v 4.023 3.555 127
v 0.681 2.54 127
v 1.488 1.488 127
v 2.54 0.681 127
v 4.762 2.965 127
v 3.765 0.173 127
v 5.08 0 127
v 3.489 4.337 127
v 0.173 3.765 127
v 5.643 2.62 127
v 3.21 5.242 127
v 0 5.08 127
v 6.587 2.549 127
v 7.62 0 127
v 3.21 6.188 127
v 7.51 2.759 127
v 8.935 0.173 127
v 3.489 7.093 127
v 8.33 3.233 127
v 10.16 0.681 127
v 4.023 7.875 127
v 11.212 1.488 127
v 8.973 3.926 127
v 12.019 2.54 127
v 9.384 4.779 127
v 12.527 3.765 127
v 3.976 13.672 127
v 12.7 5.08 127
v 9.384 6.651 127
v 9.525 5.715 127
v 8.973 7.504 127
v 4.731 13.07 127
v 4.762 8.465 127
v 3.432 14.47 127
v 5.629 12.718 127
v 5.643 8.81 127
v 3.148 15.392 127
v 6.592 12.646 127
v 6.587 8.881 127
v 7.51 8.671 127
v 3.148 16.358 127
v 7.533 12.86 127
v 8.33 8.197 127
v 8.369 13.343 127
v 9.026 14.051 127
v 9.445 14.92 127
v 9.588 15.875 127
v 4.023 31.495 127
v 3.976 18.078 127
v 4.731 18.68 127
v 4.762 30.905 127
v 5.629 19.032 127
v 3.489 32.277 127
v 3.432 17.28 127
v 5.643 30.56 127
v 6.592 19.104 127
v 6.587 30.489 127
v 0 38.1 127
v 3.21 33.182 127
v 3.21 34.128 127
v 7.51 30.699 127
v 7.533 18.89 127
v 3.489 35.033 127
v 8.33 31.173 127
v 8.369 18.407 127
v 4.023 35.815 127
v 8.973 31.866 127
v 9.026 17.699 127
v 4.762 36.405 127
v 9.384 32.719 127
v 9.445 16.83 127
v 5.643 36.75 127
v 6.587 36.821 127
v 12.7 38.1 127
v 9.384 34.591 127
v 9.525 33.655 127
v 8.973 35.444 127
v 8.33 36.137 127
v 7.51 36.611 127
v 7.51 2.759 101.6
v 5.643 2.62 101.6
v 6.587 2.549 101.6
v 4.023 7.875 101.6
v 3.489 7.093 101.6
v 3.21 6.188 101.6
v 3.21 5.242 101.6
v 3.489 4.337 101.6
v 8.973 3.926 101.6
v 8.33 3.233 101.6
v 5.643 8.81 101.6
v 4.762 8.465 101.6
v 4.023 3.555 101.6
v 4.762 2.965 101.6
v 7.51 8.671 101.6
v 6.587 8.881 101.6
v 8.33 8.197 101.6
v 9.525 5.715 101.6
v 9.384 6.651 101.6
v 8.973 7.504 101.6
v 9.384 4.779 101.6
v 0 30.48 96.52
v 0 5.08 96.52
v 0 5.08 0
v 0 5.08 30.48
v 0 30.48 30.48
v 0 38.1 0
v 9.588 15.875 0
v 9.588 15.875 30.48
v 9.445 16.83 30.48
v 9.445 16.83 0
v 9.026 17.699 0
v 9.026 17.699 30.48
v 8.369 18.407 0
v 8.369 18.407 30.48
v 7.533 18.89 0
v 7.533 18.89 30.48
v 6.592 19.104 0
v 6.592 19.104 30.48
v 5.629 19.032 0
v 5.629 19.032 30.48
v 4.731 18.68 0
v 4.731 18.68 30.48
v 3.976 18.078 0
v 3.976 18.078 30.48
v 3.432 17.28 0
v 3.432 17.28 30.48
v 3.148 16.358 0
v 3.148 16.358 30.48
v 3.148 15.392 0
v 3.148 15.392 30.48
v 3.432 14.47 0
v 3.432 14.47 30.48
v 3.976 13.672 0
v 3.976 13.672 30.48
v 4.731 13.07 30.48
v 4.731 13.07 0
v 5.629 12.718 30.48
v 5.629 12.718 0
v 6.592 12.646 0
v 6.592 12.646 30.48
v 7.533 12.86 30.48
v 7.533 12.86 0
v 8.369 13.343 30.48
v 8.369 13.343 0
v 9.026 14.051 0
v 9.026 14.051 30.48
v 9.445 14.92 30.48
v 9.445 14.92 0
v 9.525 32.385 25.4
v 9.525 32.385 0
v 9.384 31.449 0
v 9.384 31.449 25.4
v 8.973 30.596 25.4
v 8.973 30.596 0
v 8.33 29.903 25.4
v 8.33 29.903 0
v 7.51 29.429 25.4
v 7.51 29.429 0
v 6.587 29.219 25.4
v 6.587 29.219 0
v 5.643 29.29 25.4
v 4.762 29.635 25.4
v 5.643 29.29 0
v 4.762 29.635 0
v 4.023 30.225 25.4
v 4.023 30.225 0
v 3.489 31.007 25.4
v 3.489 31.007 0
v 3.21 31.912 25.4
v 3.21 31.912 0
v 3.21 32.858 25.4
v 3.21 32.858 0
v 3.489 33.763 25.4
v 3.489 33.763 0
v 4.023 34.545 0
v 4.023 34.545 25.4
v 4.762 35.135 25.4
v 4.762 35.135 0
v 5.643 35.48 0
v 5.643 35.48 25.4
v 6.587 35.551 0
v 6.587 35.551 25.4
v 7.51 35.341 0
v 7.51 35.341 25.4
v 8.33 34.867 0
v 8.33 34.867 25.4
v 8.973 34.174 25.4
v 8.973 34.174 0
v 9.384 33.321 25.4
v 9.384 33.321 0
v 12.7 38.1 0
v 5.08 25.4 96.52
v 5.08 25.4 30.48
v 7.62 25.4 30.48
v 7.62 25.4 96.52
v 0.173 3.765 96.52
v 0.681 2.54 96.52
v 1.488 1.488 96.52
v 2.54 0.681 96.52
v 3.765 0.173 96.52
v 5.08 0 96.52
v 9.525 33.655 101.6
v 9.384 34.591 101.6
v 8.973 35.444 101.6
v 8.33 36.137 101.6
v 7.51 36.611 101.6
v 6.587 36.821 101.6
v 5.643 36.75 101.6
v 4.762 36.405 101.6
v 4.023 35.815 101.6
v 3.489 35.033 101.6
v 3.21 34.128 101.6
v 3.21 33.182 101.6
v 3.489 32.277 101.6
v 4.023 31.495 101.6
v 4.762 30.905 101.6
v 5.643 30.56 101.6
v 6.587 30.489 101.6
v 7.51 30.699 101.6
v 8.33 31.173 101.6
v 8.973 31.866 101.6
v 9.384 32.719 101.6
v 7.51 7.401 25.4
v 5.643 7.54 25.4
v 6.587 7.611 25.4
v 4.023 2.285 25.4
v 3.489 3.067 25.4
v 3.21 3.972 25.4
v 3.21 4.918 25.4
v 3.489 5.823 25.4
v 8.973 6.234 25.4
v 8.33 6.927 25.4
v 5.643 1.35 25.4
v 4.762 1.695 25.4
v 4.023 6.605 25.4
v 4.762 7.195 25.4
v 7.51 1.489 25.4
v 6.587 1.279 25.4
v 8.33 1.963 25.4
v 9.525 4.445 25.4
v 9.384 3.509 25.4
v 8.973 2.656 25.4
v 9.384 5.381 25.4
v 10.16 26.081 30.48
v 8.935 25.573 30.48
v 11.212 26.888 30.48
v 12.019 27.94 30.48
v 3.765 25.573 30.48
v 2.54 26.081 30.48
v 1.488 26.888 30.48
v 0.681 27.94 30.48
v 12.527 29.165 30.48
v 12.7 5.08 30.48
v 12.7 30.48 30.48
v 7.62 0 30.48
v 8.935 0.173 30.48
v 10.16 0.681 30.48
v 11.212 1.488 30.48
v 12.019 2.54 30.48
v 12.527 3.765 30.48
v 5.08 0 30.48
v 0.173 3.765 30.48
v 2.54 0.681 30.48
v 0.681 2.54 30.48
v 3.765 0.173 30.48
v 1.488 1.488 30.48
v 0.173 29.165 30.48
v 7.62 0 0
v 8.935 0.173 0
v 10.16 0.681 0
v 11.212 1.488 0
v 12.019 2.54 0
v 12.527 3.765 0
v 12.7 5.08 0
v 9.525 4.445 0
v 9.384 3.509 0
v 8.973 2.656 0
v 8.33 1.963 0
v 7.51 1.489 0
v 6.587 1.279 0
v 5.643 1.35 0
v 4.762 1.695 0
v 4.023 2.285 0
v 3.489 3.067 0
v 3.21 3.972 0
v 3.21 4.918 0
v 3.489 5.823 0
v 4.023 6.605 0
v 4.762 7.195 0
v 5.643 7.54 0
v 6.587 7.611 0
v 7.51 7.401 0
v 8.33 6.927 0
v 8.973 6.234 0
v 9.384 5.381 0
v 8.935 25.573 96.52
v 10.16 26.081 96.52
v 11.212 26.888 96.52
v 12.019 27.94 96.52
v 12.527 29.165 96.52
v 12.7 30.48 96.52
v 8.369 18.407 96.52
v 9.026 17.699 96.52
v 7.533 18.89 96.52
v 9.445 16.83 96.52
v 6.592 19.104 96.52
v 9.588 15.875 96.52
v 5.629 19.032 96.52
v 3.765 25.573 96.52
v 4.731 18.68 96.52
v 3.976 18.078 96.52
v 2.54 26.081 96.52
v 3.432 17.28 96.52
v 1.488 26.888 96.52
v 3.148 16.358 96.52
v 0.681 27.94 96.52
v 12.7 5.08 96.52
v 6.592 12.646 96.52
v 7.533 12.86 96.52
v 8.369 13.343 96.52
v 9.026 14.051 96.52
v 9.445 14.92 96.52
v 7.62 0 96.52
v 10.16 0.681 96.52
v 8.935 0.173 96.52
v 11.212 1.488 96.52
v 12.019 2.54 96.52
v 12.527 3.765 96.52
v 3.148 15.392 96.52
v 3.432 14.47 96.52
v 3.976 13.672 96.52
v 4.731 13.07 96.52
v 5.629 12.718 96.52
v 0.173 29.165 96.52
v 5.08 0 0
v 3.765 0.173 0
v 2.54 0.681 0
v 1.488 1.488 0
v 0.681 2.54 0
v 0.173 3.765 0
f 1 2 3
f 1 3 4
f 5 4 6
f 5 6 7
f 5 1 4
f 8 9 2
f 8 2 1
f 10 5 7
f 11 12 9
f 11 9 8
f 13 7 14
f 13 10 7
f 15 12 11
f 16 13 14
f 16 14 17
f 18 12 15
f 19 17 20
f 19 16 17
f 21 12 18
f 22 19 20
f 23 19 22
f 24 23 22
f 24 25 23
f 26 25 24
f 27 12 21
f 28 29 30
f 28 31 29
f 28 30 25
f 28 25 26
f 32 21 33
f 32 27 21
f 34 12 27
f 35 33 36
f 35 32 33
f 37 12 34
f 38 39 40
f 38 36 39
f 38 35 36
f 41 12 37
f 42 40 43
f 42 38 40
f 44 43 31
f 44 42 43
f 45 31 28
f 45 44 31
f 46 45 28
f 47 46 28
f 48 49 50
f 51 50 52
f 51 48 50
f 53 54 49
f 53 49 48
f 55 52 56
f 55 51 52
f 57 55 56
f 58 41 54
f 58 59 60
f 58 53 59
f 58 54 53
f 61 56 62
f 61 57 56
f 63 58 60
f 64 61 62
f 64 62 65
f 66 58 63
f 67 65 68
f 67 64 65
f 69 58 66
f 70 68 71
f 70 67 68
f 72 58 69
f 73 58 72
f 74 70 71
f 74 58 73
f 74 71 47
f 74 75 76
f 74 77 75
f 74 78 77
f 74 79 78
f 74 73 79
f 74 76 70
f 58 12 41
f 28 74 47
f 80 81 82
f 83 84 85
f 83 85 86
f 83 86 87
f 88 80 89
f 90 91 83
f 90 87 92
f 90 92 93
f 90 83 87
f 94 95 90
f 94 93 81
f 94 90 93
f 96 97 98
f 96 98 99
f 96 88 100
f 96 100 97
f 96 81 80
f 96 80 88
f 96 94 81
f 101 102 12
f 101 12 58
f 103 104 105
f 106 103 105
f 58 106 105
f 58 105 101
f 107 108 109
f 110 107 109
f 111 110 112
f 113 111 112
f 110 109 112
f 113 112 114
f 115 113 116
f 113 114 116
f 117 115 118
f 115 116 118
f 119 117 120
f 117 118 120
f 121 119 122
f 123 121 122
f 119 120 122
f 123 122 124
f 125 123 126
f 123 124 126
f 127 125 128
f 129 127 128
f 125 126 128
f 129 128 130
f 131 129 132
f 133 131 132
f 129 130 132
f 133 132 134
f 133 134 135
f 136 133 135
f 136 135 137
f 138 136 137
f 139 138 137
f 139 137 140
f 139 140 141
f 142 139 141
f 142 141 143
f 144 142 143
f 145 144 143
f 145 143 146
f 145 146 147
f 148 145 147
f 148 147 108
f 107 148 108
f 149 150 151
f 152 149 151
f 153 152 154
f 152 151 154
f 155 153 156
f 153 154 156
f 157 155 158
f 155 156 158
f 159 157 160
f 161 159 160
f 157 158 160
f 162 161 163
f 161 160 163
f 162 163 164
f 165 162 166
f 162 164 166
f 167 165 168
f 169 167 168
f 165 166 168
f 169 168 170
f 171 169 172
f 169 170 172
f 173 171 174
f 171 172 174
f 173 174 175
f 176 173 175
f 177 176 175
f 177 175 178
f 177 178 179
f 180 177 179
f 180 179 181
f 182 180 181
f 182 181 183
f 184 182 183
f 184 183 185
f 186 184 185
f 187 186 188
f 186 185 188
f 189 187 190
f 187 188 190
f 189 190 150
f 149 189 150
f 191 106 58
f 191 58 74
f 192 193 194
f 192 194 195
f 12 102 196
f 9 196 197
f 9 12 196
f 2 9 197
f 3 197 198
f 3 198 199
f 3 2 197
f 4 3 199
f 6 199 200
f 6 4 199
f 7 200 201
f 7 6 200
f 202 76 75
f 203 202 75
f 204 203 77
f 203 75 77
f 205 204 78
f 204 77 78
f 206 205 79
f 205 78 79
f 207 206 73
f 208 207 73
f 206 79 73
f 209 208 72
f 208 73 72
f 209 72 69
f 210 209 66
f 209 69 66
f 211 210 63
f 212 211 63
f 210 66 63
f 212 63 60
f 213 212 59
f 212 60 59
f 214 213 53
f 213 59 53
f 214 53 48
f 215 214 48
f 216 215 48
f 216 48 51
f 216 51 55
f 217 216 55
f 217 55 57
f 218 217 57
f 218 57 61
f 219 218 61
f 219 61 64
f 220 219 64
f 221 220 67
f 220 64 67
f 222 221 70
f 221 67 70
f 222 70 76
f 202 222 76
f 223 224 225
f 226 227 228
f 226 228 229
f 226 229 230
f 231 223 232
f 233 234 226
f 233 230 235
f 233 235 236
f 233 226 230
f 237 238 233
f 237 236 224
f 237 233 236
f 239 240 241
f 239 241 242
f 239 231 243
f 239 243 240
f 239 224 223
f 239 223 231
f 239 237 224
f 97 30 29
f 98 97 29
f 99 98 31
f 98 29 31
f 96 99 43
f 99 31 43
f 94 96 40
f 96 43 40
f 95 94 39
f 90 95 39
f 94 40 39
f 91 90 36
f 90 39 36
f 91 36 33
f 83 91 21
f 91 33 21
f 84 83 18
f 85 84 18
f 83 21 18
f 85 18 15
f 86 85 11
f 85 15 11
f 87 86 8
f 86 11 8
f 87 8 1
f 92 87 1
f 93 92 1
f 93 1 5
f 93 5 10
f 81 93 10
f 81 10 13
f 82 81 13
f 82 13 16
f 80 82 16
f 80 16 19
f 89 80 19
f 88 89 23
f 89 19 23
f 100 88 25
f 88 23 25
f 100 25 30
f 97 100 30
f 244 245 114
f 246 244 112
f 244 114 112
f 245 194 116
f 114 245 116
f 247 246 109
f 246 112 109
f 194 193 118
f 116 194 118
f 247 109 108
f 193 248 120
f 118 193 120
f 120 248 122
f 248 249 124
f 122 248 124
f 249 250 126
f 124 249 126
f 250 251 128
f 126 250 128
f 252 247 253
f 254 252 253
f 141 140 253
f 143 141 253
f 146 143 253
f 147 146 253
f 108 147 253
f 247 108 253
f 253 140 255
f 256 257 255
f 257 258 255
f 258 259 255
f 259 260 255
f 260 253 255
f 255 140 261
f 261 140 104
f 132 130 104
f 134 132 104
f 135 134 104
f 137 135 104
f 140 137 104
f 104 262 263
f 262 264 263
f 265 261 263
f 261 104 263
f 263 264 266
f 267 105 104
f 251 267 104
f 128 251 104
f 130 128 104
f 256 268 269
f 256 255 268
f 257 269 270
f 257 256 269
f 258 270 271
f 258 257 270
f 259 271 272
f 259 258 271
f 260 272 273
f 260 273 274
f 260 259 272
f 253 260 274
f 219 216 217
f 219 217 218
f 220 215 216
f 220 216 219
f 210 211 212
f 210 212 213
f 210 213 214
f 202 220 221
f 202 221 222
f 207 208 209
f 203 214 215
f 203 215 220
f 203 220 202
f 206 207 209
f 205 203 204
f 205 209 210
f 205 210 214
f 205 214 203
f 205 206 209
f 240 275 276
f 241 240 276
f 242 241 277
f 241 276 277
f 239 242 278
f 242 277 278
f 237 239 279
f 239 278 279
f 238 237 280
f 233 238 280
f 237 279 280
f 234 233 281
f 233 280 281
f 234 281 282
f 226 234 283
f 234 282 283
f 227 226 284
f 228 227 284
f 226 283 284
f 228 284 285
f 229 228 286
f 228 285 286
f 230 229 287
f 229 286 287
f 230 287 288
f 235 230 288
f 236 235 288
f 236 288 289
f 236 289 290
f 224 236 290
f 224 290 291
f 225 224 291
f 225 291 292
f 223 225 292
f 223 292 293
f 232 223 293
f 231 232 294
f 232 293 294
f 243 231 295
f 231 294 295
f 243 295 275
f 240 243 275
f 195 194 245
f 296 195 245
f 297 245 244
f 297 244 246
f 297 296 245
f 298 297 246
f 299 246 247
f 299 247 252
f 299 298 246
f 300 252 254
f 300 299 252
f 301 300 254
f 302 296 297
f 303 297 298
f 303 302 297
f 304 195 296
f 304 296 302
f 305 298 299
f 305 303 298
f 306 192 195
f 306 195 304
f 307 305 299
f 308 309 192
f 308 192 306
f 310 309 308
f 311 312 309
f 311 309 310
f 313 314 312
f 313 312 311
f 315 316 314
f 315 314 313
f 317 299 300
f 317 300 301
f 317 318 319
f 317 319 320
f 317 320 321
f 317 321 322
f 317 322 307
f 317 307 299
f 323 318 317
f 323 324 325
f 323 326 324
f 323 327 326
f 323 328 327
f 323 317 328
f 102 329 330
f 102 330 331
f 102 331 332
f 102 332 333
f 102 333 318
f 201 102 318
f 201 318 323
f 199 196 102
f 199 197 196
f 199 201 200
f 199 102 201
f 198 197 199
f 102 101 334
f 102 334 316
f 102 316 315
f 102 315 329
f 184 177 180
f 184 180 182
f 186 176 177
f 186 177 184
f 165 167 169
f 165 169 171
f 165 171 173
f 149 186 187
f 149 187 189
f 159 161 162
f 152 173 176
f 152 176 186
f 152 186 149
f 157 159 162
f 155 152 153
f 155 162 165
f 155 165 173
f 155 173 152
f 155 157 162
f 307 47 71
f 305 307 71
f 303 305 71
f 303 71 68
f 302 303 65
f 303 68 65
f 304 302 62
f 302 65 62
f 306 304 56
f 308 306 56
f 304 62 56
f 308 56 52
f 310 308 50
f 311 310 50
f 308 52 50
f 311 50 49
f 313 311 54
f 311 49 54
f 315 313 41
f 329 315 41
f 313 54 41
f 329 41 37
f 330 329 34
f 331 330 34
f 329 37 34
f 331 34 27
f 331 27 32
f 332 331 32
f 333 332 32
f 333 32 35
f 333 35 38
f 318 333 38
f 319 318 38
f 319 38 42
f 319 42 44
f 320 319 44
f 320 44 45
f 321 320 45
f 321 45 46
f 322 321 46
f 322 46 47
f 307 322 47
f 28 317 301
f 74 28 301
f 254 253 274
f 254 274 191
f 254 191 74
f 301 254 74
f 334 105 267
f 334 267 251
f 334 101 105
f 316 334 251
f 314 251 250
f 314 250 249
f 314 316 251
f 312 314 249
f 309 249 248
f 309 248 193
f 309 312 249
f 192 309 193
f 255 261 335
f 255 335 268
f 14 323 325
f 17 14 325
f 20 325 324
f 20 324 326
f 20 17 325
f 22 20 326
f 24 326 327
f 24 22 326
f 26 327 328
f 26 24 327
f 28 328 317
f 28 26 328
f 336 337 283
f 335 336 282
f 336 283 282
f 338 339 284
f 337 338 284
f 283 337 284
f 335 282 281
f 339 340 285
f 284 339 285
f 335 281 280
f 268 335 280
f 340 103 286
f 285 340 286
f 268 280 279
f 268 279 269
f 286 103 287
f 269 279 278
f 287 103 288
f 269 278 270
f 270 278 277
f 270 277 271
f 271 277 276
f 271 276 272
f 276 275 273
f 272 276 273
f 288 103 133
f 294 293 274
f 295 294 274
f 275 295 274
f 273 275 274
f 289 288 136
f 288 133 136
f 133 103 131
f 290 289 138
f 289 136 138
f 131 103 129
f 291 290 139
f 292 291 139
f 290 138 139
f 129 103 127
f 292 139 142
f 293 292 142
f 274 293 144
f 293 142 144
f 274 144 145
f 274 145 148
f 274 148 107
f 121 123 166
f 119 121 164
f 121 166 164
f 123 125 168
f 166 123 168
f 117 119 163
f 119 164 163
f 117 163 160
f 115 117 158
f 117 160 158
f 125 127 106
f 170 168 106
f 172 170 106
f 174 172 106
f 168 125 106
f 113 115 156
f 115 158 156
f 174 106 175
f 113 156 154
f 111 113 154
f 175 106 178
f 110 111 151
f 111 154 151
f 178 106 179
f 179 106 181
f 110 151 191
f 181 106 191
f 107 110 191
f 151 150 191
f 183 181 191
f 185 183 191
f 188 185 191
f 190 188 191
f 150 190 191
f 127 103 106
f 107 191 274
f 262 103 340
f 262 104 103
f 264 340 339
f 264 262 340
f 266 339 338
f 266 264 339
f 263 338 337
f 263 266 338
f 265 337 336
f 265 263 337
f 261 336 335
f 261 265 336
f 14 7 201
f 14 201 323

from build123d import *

# Parameters (mm, degrees)
F0_W     = 12.7
F0_H     = 38.1
F1_DEPTH = 127
F2_R     = 3.2385
F3_DEPTH = 152.4
F2_R_2   = 3.175
F4_DEPTH = 25.4
F5_R     = 3.175
F6_DEPTH = 25.4
F7_W     = 25.4
F7_H     = 66.04
F8_DEPTH = 25.4
F9_R     = 5.08


with BuildPart() as f1:
    # F0 (on Top) → F1 (new body)
    with BuildSketch(Plane.XY):
        with Locations((6.35, 19.05)):
            Rectangle(F0_W, F0_H)
    extrude(amount=F1_DEPTH)

    # F2 (on face) → F3 (cut)
    with BuildSketch(Plane.XY.offset(127)):
        with Locations((6.35, 15.875)):
            Circle(F2_R)
    extrude(amount=-F3_DEPTH, mode=Mode.SUBTRACT)

    # F2 (on face) → F4 (cut)
    with BuildSketch(Plane.XY.offset(127)):
        with Locations((6.35, 33.655)):
            Circle(F2_R_2)
        with Locations((6.35, 5.715)):
            Circle(F2_R_2)
    extrude(amount=-F4_DEPTH, mode=Mode.SUBTRACT)

    # F5 (on face) → F6 (cut)
    with BuildSketch(Plane(origin=(0, 0, 0), x_dir=(1, 0, 0), z_dir=(0, 0, -1))):
        with Locations((6.35, -4.445)):
            Circle(F5_R)
        with Locations((6.35, -32.385)):
            Circle(F5_R)
    extrude(amount=-F6_DEPTH, mode=Mode.SUBTRACT)

    # F7 (on face) → F8 (cut)
    with BuildSketch(Plane(origin=(0, 0, 0), x_dir=(0, -1, 0), z_dir=(-1, 0, 0))):
        with Locations((-12.7, 63.5)):
            Rectangle(F7_W, F7_H)
    extrude(amount=-F8_DEPTH, mode=Mode.SUBTRACT)

    # F9
    f9_edges = [f1.edges().sort_by_distance(p)[0] for p in [
        (12.7, 0, 15.24),
        (12.7, 0, 111.76),
        (0, 0, 15.24),
        (0, 0, 111.76),
        (12.7, 25.4, 63.5),
        (0, 25.4, 63.5),
    ]]
    fillet(f9_edges, radius=F9_R)


solid = f1.part
